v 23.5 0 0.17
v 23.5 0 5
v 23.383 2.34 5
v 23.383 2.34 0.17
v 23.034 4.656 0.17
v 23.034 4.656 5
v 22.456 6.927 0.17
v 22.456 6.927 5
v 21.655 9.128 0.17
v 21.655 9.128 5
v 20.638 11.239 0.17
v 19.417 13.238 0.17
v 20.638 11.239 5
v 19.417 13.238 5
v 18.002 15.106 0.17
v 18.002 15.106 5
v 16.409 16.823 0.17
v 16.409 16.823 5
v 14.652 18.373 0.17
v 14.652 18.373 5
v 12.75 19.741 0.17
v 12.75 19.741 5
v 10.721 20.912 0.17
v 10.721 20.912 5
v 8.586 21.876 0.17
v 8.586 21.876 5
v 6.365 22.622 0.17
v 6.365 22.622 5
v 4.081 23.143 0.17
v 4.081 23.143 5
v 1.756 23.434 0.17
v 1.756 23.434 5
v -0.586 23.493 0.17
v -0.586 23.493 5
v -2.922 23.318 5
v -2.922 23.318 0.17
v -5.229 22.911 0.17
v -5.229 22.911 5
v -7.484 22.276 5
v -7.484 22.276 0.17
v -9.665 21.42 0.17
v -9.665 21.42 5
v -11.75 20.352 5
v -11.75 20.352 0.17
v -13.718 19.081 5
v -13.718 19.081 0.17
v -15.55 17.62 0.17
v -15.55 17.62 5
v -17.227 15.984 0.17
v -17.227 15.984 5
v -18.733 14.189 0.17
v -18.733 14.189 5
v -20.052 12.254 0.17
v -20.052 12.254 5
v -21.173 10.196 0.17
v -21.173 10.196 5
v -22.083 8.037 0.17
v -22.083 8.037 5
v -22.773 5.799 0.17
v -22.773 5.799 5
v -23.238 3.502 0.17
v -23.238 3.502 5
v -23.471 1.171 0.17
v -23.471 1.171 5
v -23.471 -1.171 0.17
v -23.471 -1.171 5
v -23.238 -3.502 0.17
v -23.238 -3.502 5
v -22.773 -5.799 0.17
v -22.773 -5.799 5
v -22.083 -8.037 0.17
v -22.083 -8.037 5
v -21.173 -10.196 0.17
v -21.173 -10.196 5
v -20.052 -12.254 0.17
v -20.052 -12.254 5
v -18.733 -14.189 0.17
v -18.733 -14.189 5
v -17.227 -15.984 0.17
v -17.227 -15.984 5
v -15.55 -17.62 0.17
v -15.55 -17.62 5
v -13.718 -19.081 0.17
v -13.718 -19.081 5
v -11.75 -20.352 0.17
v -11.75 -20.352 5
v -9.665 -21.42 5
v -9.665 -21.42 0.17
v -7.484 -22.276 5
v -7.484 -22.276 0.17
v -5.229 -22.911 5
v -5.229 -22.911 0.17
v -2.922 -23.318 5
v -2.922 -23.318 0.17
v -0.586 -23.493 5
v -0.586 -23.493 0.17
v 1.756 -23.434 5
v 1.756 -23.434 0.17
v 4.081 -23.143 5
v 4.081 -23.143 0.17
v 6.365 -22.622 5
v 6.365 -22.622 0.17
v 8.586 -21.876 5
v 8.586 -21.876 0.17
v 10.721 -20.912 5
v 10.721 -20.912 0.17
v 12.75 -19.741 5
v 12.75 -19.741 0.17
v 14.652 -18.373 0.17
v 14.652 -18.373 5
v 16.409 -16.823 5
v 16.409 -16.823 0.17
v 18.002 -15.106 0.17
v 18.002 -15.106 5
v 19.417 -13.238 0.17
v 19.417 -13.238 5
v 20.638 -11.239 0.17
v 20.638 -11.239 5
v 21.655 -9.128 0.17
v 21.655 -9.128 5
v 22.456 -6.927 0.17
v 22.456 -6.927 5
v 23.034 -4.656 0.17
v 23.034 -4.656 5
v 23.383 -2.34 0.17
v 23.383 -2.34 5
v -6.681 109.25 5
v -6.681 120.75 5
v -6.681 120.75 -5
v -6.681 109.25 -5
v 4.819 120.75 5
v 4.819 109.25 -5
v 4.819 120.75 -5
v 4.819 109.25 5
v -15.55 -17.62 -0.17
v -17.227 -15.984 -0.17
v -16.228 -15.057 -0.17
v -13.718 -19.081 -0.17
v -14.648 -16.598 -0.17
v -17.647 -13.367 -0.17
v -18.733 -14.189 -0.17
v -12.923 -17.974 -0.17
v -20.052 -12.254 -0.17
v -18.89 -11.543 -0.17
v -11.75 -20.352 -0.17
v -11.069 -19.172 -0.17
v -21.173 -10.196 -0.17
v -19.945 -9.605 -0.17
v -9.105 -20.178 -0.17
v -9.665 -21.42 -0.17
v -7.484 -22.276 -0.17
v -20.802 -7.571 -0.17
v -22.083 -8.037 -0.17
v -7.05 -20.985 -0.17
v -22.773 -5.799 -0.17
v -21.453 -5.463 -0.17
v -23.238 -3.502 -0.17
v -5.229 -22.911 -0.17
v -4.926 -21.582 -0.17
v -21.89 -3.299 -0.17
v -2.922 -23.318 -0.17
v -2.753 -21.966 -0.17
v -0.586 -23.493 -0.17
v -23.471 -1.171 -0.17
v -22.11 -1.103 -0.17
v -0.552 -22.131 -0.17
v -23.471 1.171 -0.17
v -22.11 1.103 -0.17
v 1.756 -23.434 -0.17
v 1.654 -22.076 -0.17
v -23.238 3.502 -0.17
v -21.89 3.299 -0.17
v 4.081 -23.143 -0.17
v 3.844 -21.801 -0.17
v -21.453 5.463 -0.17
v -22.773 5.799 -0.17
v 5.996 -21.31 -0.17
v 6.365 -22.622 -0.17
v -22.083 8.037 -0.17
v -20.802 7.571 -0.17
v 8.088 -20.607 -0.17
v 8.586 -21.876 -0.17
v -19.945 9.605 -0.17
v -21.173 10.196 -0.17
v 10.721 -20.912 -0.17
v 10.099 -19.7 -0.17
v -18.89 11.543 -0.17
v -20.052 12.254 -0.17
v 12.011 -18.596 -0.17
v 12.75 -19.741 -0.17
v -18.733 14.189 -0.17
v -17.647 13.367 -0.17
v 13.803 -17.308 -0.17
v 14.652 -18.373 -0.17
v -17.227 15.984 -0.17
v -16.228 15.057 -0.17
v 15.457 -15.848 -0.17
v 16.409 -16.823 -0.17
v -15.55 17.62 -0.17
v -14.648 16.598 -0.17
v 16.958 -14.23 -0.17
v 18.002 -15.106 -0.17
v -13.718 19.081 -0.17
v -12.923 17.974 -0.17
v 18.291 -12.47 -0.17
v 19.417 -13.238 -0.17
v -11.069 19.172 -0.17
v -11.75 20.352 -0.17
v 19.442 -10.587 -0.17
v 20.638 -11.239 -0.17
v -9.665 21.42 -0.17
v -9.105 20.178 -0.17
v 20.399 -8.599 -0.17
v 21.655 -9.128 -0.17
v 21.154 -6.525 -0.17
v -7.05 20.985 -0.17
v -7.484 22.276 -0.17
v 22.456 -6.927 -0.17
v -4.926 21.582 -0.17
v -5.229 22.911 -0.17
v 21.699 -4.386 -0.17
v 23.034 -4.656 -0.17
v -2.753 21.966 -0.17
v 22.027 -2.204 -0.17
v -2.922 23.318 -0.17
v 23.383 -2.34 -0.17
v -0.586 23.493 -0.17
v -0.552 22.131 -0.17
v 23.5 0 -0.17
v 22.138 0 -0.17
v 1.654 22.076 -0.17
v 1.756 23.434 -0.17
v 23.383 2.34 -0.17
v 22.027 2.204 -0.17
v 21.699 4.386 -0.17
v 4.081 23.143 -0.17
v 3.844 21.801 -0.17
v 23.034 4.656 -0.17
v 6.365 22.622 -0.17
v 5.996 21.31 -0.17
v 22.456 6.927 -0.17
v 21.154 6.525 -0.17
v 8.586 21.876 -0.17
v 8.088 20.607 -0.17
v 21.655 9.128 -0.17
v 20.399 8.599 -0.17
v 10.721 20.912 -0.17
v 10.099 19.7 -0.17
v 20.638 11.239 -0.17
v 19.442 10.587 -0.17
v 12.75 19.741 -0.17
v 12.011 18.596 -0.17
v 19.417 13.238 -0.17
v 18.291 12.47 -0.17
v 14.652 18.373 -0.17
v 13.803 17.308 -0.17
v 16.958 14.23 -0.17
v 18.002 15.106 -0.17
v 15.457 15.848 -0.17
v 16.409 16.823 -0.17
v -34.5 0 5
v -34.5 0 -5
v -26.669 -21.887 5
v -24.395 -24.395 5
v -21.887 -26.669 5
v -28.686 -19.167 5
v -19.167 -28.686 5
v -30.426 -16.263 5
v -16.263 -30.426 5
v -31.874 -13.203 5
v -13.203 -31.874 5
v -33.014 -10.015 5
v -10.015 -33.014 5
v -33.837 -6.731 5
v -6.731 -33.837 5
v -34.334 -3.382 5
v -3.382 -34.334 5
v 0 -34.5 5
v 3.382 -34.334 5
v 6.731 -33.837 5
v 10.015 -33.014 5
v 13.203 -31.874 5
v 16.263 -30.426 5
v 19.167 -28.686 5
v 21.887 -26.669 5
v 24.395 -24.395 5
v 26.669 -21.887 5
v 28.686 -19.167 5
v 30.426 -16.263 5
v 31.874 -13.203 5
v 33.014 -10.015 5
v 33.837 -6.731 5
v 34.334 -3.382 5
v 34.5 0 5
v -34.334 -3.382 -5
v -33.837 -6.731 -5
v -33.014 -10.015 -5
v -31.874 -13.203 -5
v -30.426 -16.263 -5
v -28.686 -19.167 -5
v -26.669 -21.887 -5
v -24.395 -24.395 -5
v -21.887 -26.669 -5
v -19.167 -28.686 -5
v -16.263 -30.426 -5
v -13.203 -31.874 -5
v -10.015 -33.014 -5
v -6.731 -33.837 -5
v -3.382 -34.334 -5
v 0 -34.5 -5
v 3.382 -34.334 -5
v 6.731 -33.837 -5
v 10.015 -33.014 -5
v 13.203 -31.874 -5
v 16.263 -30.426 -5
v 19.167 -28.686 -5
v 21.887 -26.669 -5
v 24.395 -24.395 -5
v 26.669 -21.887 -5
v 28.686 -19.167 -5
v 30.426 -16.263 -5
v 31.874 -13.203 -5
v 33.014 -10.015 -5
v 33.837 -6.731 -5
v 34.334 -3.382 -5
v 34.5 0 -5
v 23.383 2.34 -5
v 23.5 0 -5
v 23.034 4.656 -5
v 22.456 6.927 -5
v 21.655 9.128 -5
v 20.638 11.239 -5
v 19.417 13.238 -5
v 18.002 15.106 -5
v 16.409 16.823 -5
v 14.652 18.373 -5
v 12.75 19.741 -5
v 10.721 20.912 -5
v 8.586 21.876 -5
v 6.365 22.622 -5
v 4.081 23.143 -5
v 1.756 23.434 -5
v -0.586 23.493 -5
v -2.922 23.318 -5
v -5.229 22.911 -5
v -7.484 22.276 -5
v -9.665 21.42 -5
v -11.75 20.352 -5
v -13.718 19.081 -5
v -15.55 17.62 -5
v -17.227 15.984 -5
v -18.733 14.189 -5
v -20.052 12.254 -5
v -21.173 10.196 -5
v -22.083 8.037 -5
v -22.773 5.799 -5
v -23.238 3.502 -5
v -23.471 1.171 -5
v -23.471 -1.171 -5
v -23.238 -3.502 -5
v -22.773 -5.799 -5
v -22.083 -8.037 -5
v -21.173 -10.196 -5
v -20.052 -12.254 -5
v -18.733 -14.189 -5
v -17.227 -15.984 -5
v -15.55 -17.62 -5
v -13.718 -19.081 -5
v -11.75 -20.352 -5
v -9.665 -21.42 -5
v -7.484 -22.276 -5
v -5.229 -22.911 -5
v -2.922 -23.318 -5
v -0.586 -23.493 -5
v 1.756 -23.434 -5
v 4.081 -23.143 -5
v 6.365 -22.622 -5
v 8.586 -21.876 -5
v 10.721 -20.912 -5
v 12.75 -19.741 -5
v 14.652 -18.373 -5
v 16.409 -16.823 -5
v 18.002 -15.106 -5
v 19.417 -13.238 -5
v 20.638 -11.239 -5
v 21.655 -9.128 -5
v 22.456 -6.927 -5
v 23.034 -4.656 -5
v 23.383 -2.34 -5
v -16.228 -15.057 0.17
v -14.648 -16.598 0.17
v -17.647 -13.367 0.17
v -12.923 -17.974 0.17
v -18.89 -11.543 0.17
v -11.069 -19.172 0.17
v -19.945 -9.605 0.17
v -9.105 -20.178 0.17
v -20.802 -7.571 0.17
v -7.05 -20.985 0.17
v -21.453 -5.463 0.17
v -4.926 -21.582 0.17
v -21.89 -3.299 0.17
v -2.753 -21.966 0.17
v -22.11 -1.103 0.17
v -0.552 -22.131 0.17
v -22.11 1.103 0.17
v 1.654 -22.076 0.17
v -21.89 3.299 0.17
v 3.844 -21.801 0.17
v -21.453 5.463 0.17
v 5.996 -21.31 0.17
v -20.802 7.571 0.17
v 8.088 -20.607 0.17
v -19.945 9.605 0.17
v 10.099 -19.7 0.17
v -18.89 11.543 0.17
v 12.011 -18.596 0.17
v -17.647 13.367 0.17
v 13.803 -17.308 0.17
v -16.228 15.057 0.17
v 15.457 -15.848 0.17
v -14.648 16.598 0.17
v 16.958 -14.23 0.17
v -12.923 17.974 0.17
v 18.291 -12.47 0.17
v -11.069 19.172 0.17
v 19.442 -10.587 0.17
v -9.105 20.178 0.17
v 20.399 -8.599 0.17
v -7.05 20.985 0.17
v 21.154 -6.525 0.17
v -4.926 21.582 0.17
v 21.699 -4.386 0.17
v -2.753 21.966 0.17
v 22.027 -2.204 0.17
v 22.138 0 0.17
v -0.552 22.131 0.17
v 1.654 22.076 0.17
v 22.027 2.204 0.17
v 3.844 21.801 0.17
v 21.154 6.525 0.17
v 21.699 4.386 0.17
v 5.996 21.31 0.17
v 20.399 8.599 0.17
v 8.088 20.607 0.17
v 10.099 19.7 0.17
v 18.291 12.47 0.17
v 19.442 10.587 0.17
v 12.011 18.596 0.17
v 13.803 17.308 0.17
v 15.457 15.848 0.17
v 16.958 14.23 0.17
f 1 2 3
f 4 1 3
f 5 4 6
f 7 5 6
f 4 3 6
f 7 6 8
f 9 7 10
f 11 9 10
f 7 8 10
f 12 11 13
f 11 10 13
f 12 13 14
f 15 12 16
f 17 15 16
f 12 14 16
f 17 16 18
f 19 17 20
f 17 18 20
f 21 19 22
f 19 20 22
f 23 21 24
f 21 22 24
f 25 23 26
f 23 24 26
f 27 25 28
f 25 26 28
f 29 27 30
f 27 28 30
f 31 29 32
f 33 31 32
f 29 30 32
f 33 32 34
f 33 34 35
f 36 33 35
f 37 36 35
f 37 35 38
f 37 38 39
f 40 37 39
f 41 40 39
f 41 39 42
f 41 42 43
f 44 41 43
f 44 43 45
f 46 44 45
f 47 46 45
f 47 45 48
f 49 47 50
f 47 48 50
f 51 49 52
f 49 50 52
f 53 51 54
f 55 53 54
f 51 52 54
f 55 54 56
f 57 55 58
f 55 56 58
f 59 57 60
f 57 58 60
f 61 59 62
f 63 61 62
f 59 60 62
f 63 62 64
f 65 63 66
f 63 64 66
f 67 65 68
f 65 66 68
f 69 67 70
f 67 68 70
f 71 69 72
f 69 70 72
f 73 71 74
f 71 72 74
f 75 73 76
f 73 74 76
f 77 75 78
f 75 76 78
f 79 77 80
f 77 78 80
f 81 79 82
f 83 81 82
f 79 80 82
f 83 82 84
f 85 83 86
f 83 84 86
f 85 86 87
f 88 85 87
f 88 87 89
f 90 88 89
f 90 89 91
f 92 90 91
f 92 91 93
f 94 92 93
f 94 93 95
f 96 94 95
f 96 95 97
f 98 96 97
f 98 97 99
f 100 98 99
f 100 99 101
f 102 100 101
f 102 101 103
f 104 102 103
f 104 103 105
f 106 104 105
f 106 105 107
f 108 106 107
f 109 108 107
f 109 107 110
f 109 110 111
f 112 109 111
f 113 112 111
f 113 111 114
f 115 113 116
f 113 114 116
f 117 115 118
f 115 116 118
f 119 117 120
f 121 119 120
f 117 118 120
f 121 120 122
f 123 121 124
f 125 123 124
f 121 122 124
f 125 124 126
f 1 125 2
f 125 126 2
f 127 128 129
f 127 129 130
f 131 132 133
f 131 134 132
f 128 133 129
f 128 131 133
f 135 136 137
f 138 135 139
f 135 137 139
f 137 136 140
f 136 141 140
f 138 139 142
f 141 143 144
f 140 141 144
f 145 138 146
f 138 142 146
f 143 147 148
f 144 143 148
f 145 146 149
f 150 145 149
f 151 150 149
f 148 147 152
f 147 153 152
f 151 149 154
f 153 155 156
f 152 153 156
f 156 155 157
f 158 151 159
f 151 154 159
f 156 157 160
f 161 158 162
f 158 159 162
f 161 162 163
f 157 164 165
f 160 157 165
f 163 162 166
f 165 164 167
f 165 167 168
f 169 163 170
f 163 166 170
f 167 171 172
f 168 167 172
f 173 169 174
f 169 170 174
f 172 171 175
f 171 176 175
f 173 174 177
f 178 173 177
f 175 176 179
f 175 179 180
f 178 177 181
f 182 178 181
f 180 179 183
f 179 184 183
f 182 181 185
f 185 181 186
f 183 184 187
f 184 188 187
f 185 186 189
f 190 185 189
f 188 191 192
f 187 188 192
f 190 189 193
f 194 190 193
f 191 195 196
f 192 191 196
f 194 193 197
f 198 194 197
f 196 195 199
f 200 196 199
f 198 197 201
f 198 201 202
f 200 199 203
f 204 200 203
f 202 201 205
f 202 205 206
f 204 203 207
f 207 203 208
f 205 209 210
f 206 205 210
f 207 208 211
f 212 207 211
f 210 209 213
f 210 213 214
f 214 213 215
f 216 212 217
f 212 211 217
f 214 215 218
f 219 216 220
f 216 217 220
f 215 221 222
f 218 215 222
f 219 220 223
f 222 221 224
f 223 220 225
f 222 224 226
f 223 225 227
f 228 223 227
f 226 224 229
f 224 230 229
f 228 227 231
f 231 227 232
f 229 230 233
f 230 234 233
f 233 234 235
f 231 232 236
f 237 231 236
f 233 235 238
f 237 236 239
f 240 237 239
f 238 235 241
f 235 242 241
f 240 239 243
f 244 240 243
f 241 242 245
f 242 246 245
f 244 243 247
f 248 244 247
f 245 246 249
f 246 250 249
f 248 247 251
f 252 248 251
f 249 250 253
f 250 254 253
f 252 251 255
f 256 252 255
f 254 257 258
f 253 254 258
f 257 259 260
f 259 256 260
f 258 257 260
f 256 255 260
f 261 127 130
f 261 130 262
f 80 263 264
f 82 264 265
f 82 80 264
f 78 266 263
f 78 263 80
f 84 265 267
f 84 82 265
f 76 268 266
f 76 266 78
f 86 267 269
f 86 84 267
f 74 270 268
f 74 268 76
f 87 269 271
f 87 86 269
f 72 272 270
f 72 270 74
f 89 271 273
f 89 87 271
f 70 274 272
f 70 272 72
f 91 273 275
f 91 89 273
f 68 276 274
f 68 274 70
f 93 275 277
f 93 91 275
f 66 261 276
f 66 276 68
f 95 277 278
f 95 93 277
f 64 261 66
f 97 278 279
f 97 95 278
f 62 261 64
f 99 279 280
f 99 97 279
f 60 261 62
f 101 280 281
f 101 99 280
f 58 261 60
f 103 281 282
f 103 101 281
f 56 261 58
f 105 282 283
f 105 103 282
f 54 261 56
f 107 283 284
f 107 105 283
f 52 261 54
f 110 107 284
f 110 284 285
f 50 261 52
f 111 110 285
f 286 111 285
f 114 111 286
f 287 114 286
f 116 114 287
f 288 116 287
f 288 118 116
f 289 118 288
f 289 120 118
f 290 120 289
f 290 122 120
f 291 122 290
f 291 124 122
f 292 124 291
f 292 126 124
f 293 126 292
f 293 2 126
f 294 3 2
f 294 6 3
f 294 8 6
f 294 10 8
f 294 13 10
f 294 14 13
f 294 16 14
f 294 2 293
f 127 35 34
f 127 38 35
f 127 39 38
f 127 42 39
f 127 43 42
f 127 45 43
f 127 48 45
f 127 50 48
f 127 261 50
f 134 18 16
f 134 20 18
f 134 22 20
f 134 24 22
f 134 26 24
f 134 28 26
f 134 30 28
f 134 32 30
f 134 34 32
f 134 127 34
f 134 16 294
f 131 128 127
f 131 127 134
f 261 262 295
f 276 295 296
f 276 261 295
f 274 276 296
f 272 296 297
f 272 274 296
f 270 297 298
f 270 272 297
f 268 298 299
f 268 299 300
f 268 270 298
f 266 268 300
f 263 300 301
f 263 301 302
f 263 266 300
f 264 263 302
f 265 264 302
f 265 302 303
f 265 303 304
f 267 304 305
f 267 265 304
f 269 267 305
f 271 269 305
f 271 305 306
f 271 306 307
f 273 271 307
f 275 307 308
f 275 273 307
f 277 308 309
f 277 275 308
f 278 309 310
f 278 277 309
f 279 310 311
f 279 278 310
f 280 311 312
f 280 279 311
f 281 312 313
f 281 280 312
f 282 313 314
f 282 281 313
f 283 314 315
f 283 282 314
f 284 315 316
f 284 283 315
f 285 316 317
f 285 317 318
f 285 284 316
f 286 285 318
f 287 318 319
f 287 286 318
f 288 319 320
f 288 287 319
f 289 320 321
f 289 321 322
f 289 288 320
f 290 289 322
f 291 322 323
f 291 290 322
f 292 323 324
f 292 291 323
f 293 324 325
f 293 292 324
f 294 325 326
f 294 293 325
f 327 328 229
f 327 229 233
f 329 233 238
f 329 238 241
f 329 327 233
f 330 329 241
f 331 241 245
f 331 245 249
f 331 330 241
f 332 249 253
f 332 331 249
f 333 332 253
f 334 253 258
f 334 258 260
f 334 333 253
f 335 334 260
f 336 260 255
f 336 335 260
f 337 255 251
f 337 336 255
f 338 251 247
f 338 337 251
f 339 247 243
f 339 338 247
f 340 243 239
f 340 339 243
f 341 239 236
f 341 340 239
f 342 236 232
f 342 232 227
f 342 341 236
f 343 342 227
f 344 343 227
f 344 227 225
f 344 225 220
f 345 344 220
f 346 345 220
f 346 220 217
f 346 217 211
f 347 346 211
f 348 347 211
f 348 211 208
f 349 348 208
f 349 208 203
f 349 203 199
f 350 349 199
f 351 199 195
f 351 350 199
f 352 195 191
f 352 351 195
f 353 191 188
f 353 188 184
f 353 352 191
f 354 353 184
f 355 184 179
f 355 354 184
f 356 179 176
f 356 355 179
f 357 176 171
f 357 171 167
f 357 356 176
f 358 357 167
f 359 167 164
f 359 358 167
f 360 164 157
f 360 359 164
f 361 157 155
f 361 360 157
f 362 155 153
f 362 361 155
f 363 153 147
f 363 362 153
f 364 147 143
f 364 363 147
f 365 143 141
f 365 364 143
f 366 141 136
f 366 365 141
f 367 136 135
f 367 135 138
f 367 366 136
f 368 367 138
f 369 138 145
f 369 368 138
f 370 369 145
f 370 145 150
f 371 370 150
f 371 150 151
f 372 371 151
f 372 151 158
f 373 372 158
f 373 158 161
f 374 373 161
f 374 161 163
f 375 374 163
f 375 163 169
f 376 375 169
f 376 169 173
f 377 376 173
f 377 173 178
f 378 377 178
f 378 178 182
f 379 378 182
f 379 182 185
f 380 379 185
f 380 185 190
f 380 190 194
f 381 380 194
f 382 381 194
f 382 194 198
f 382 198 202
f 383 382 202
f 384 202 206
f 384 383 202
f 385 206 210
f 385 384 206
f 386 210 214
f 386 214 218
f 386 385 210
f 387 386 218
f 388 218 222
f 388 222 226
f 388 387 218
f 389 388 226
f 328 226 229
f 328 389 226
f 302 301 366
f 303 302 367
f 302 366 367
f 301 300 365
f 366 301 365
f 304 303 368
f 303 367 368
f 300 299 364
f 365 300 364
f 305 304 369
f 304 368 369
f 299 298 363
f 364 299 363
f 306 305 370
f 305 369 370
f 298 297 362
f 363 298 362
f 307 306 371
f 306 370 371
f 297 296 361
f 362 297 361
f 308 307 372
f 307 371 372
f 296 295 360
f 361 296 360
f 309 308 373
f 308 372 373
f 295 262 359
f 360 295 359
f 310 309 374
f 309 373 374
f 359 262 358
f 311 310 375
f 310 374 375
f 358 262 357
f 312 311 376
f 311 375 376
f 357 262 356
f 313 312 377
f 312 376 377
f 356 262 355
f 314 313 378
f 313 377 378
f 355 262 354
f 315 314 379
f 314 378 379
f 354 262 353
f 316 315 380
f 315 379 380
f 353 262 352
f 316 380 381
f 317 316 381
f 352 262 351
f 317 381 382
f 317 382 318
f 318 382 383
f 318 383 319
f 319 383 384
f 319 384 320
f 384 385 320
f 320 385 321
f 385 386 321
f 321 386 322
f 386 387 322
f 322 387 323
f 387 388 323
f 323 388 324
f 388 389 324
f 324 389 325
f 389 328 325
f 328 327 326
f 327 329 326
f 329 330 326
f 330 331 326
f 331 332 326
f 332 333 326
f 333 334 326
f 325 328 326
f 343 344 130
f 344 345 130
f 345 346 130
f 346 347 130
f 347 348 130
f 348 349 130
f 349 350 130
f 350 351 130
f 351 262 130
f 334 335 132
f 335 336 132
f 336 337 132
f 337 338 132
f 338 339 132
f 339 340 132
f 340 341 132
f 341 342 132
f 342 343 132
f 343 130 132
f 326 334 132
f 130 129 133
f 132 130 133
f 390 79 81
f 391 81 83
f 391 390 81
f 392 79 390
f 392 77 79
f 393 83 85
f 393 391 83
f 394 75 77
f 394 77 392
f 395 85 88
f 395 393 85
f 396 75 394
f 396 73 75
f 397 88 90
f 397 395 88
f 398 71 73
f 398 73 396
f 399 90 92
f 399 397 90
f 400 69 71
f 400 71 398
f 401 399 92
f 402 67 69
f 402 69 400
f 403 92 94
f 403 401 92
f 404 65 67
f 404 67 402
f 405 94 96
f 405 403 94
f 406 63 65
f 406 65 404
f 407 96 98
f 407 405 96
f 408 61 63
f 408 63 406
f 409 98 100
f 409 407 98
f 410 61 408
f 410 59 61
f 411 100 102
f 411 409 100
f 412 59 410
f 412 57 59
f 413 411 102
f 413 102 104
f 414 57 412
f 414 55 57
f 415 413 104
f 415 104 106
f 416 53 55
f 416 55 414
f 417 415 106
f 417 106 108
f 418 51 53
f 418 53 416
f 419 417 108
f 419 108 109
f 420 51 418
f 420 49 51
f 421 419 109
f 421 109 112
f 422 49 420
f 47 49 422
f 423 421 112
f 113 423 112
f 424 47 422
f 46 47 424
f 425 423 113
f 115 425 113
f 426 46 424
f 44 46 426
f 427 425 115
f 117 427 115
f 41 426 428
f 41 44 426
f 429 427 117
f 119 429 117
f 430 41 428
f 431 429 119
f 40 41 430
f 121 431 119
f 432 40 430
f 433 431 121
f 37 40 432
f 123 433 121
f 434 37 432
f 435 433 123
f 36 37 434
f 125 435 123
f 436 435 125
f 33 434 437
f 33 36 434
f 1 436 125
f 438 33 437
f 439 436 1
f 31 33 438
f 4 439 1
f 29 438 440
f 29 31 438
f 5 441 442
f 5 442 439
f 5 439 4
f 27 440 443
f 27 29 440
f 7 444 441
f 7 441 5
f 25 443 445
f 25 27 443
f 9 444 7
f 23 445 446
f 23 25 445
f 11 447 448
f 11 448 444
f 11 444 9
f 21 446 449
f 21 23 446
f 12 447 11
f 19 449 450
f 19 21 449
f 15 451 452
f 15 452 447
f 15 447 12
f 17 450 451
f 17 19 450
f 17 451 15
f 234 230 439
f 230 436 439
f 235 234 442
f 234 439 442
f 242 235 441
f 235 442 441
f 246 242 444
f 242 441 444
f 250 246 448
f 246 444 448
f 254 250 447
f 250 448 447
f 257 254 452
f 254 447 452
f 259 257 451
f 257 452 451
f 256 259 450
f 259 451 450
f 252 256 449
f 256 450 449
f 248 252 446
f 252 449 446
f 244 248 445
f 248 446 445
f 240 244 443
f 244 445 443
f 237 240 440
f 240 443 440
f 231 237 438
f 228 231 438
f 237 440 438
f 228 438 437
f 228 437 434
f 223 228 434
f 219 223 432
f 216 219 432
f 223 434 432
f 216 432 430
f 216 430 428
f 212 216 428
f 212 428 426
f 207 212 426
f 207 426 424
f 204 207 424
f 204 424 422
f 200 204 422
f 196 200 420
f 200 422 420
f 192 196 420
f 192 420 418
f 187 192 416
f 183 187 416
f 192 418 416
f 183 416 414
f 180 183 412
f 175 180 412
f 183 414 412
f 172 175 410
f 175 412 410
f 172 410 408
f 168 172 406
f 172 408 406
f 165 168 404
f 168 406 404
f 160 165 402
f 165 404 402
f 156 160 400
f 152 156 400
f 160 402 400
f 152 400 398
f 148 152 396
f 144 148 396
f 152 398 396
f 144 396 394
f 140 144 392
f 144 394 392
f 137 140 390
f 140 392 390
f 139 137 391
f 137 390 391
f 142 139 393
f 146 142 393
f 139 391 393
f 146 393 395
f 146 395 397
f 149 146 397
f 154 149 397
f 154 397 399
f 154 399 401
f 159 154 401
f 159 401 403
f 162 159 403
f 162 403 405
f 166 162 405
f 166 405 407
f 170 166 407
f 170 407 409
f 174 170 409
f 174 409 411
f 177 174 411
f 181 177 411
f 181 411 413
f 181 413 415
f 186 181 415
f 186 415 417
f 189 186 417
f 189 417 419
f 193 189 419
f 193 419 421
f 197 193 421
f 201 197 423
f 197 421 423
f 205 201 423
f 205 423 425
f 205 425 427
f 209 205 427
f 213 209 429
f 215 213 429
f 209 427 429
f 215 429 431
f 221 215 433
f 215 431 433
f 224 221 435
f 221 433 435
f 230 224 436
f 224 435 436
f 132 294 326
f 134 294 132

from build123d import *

# Parameters (mm, degrees)
BOSS_EXTRUDE1_DEPTH     = 5
CUT_EXTRUDE1_START      = 5
SKETCH2_R               = 23.5
CUT_EXTRUDE1_DEPTH      = 4.83
CUT_EXTRUDE2_START      = -5
SKETCH2_2_R             = 23.5
CUT_EXTRUDE2_DEPTH      = 4.83
SKETCH3_R               = 22.1375
CUT_EXTRUDE3_DEPTH      = 6
CUT_EXTRUDE3_DEPTH_BACK = 6


with BuildPart() as part:
    # Sketch1 → Boss-Extrude1 (new body, symmetric)
    with BuildSketch(Plane.XY):
        with BuildLine():
            Line((4.819095737, 120.75), (-6.680904263, 120.75))
            Line((-6.680904263, 120.75), (-6.680904263, 109.25))
            Line((-6.680904263, 109.25), (-34.5, 0))
            ThreePointArc((-34.5, 0), (0, -34.5), (34.5, 0))
            Line((34.5, 0), (4.819095737, 109.25))
            Line((4.819095737, 109.25), (4.819095737, 120.75))
        make_face()
    extrude(amount=BOSS_EXTRUDE1_DEPTH, both=True)

    # Sketch2 → Cut-Extrude1 (cut)
    with BuildSketch(Plane.XY.offset(CUT_EXTRUDE1_START)):
        Circle(SKETCH2_R)
    extrude(amount=-CUT_EXTRUDE1_DEPTH, mode=Mode.SUBTRACT)

    # Sketch2<2> → Cut-Extrude2 (cut)
    with BuildSketch(Plane.XY.offset(CUT_EXTRUDE2_START)):
        Circle(SKETCH2_2_R)
    extrude(amount=CUT_EXTRUDE2_DEPTH, mode=Mode.SUBTRACT)

    # Sketch3 → Cut-Extrude3 (cut, two sides)
    with BuildSketch(Plane.XY) as cut_extrude3_sk:
        Circle(SKETCH3_R)
    extrude(amount=CUT_EXTRUDE3_DEPTH, mode=Mode.SUBTRACT)
    extrude(cut_extrude3_sk.sketch, amount=-CUT_EXTRUDE3_DEPTH_BACK, mode=Mode.SUBTRACT)


solid = part.part
